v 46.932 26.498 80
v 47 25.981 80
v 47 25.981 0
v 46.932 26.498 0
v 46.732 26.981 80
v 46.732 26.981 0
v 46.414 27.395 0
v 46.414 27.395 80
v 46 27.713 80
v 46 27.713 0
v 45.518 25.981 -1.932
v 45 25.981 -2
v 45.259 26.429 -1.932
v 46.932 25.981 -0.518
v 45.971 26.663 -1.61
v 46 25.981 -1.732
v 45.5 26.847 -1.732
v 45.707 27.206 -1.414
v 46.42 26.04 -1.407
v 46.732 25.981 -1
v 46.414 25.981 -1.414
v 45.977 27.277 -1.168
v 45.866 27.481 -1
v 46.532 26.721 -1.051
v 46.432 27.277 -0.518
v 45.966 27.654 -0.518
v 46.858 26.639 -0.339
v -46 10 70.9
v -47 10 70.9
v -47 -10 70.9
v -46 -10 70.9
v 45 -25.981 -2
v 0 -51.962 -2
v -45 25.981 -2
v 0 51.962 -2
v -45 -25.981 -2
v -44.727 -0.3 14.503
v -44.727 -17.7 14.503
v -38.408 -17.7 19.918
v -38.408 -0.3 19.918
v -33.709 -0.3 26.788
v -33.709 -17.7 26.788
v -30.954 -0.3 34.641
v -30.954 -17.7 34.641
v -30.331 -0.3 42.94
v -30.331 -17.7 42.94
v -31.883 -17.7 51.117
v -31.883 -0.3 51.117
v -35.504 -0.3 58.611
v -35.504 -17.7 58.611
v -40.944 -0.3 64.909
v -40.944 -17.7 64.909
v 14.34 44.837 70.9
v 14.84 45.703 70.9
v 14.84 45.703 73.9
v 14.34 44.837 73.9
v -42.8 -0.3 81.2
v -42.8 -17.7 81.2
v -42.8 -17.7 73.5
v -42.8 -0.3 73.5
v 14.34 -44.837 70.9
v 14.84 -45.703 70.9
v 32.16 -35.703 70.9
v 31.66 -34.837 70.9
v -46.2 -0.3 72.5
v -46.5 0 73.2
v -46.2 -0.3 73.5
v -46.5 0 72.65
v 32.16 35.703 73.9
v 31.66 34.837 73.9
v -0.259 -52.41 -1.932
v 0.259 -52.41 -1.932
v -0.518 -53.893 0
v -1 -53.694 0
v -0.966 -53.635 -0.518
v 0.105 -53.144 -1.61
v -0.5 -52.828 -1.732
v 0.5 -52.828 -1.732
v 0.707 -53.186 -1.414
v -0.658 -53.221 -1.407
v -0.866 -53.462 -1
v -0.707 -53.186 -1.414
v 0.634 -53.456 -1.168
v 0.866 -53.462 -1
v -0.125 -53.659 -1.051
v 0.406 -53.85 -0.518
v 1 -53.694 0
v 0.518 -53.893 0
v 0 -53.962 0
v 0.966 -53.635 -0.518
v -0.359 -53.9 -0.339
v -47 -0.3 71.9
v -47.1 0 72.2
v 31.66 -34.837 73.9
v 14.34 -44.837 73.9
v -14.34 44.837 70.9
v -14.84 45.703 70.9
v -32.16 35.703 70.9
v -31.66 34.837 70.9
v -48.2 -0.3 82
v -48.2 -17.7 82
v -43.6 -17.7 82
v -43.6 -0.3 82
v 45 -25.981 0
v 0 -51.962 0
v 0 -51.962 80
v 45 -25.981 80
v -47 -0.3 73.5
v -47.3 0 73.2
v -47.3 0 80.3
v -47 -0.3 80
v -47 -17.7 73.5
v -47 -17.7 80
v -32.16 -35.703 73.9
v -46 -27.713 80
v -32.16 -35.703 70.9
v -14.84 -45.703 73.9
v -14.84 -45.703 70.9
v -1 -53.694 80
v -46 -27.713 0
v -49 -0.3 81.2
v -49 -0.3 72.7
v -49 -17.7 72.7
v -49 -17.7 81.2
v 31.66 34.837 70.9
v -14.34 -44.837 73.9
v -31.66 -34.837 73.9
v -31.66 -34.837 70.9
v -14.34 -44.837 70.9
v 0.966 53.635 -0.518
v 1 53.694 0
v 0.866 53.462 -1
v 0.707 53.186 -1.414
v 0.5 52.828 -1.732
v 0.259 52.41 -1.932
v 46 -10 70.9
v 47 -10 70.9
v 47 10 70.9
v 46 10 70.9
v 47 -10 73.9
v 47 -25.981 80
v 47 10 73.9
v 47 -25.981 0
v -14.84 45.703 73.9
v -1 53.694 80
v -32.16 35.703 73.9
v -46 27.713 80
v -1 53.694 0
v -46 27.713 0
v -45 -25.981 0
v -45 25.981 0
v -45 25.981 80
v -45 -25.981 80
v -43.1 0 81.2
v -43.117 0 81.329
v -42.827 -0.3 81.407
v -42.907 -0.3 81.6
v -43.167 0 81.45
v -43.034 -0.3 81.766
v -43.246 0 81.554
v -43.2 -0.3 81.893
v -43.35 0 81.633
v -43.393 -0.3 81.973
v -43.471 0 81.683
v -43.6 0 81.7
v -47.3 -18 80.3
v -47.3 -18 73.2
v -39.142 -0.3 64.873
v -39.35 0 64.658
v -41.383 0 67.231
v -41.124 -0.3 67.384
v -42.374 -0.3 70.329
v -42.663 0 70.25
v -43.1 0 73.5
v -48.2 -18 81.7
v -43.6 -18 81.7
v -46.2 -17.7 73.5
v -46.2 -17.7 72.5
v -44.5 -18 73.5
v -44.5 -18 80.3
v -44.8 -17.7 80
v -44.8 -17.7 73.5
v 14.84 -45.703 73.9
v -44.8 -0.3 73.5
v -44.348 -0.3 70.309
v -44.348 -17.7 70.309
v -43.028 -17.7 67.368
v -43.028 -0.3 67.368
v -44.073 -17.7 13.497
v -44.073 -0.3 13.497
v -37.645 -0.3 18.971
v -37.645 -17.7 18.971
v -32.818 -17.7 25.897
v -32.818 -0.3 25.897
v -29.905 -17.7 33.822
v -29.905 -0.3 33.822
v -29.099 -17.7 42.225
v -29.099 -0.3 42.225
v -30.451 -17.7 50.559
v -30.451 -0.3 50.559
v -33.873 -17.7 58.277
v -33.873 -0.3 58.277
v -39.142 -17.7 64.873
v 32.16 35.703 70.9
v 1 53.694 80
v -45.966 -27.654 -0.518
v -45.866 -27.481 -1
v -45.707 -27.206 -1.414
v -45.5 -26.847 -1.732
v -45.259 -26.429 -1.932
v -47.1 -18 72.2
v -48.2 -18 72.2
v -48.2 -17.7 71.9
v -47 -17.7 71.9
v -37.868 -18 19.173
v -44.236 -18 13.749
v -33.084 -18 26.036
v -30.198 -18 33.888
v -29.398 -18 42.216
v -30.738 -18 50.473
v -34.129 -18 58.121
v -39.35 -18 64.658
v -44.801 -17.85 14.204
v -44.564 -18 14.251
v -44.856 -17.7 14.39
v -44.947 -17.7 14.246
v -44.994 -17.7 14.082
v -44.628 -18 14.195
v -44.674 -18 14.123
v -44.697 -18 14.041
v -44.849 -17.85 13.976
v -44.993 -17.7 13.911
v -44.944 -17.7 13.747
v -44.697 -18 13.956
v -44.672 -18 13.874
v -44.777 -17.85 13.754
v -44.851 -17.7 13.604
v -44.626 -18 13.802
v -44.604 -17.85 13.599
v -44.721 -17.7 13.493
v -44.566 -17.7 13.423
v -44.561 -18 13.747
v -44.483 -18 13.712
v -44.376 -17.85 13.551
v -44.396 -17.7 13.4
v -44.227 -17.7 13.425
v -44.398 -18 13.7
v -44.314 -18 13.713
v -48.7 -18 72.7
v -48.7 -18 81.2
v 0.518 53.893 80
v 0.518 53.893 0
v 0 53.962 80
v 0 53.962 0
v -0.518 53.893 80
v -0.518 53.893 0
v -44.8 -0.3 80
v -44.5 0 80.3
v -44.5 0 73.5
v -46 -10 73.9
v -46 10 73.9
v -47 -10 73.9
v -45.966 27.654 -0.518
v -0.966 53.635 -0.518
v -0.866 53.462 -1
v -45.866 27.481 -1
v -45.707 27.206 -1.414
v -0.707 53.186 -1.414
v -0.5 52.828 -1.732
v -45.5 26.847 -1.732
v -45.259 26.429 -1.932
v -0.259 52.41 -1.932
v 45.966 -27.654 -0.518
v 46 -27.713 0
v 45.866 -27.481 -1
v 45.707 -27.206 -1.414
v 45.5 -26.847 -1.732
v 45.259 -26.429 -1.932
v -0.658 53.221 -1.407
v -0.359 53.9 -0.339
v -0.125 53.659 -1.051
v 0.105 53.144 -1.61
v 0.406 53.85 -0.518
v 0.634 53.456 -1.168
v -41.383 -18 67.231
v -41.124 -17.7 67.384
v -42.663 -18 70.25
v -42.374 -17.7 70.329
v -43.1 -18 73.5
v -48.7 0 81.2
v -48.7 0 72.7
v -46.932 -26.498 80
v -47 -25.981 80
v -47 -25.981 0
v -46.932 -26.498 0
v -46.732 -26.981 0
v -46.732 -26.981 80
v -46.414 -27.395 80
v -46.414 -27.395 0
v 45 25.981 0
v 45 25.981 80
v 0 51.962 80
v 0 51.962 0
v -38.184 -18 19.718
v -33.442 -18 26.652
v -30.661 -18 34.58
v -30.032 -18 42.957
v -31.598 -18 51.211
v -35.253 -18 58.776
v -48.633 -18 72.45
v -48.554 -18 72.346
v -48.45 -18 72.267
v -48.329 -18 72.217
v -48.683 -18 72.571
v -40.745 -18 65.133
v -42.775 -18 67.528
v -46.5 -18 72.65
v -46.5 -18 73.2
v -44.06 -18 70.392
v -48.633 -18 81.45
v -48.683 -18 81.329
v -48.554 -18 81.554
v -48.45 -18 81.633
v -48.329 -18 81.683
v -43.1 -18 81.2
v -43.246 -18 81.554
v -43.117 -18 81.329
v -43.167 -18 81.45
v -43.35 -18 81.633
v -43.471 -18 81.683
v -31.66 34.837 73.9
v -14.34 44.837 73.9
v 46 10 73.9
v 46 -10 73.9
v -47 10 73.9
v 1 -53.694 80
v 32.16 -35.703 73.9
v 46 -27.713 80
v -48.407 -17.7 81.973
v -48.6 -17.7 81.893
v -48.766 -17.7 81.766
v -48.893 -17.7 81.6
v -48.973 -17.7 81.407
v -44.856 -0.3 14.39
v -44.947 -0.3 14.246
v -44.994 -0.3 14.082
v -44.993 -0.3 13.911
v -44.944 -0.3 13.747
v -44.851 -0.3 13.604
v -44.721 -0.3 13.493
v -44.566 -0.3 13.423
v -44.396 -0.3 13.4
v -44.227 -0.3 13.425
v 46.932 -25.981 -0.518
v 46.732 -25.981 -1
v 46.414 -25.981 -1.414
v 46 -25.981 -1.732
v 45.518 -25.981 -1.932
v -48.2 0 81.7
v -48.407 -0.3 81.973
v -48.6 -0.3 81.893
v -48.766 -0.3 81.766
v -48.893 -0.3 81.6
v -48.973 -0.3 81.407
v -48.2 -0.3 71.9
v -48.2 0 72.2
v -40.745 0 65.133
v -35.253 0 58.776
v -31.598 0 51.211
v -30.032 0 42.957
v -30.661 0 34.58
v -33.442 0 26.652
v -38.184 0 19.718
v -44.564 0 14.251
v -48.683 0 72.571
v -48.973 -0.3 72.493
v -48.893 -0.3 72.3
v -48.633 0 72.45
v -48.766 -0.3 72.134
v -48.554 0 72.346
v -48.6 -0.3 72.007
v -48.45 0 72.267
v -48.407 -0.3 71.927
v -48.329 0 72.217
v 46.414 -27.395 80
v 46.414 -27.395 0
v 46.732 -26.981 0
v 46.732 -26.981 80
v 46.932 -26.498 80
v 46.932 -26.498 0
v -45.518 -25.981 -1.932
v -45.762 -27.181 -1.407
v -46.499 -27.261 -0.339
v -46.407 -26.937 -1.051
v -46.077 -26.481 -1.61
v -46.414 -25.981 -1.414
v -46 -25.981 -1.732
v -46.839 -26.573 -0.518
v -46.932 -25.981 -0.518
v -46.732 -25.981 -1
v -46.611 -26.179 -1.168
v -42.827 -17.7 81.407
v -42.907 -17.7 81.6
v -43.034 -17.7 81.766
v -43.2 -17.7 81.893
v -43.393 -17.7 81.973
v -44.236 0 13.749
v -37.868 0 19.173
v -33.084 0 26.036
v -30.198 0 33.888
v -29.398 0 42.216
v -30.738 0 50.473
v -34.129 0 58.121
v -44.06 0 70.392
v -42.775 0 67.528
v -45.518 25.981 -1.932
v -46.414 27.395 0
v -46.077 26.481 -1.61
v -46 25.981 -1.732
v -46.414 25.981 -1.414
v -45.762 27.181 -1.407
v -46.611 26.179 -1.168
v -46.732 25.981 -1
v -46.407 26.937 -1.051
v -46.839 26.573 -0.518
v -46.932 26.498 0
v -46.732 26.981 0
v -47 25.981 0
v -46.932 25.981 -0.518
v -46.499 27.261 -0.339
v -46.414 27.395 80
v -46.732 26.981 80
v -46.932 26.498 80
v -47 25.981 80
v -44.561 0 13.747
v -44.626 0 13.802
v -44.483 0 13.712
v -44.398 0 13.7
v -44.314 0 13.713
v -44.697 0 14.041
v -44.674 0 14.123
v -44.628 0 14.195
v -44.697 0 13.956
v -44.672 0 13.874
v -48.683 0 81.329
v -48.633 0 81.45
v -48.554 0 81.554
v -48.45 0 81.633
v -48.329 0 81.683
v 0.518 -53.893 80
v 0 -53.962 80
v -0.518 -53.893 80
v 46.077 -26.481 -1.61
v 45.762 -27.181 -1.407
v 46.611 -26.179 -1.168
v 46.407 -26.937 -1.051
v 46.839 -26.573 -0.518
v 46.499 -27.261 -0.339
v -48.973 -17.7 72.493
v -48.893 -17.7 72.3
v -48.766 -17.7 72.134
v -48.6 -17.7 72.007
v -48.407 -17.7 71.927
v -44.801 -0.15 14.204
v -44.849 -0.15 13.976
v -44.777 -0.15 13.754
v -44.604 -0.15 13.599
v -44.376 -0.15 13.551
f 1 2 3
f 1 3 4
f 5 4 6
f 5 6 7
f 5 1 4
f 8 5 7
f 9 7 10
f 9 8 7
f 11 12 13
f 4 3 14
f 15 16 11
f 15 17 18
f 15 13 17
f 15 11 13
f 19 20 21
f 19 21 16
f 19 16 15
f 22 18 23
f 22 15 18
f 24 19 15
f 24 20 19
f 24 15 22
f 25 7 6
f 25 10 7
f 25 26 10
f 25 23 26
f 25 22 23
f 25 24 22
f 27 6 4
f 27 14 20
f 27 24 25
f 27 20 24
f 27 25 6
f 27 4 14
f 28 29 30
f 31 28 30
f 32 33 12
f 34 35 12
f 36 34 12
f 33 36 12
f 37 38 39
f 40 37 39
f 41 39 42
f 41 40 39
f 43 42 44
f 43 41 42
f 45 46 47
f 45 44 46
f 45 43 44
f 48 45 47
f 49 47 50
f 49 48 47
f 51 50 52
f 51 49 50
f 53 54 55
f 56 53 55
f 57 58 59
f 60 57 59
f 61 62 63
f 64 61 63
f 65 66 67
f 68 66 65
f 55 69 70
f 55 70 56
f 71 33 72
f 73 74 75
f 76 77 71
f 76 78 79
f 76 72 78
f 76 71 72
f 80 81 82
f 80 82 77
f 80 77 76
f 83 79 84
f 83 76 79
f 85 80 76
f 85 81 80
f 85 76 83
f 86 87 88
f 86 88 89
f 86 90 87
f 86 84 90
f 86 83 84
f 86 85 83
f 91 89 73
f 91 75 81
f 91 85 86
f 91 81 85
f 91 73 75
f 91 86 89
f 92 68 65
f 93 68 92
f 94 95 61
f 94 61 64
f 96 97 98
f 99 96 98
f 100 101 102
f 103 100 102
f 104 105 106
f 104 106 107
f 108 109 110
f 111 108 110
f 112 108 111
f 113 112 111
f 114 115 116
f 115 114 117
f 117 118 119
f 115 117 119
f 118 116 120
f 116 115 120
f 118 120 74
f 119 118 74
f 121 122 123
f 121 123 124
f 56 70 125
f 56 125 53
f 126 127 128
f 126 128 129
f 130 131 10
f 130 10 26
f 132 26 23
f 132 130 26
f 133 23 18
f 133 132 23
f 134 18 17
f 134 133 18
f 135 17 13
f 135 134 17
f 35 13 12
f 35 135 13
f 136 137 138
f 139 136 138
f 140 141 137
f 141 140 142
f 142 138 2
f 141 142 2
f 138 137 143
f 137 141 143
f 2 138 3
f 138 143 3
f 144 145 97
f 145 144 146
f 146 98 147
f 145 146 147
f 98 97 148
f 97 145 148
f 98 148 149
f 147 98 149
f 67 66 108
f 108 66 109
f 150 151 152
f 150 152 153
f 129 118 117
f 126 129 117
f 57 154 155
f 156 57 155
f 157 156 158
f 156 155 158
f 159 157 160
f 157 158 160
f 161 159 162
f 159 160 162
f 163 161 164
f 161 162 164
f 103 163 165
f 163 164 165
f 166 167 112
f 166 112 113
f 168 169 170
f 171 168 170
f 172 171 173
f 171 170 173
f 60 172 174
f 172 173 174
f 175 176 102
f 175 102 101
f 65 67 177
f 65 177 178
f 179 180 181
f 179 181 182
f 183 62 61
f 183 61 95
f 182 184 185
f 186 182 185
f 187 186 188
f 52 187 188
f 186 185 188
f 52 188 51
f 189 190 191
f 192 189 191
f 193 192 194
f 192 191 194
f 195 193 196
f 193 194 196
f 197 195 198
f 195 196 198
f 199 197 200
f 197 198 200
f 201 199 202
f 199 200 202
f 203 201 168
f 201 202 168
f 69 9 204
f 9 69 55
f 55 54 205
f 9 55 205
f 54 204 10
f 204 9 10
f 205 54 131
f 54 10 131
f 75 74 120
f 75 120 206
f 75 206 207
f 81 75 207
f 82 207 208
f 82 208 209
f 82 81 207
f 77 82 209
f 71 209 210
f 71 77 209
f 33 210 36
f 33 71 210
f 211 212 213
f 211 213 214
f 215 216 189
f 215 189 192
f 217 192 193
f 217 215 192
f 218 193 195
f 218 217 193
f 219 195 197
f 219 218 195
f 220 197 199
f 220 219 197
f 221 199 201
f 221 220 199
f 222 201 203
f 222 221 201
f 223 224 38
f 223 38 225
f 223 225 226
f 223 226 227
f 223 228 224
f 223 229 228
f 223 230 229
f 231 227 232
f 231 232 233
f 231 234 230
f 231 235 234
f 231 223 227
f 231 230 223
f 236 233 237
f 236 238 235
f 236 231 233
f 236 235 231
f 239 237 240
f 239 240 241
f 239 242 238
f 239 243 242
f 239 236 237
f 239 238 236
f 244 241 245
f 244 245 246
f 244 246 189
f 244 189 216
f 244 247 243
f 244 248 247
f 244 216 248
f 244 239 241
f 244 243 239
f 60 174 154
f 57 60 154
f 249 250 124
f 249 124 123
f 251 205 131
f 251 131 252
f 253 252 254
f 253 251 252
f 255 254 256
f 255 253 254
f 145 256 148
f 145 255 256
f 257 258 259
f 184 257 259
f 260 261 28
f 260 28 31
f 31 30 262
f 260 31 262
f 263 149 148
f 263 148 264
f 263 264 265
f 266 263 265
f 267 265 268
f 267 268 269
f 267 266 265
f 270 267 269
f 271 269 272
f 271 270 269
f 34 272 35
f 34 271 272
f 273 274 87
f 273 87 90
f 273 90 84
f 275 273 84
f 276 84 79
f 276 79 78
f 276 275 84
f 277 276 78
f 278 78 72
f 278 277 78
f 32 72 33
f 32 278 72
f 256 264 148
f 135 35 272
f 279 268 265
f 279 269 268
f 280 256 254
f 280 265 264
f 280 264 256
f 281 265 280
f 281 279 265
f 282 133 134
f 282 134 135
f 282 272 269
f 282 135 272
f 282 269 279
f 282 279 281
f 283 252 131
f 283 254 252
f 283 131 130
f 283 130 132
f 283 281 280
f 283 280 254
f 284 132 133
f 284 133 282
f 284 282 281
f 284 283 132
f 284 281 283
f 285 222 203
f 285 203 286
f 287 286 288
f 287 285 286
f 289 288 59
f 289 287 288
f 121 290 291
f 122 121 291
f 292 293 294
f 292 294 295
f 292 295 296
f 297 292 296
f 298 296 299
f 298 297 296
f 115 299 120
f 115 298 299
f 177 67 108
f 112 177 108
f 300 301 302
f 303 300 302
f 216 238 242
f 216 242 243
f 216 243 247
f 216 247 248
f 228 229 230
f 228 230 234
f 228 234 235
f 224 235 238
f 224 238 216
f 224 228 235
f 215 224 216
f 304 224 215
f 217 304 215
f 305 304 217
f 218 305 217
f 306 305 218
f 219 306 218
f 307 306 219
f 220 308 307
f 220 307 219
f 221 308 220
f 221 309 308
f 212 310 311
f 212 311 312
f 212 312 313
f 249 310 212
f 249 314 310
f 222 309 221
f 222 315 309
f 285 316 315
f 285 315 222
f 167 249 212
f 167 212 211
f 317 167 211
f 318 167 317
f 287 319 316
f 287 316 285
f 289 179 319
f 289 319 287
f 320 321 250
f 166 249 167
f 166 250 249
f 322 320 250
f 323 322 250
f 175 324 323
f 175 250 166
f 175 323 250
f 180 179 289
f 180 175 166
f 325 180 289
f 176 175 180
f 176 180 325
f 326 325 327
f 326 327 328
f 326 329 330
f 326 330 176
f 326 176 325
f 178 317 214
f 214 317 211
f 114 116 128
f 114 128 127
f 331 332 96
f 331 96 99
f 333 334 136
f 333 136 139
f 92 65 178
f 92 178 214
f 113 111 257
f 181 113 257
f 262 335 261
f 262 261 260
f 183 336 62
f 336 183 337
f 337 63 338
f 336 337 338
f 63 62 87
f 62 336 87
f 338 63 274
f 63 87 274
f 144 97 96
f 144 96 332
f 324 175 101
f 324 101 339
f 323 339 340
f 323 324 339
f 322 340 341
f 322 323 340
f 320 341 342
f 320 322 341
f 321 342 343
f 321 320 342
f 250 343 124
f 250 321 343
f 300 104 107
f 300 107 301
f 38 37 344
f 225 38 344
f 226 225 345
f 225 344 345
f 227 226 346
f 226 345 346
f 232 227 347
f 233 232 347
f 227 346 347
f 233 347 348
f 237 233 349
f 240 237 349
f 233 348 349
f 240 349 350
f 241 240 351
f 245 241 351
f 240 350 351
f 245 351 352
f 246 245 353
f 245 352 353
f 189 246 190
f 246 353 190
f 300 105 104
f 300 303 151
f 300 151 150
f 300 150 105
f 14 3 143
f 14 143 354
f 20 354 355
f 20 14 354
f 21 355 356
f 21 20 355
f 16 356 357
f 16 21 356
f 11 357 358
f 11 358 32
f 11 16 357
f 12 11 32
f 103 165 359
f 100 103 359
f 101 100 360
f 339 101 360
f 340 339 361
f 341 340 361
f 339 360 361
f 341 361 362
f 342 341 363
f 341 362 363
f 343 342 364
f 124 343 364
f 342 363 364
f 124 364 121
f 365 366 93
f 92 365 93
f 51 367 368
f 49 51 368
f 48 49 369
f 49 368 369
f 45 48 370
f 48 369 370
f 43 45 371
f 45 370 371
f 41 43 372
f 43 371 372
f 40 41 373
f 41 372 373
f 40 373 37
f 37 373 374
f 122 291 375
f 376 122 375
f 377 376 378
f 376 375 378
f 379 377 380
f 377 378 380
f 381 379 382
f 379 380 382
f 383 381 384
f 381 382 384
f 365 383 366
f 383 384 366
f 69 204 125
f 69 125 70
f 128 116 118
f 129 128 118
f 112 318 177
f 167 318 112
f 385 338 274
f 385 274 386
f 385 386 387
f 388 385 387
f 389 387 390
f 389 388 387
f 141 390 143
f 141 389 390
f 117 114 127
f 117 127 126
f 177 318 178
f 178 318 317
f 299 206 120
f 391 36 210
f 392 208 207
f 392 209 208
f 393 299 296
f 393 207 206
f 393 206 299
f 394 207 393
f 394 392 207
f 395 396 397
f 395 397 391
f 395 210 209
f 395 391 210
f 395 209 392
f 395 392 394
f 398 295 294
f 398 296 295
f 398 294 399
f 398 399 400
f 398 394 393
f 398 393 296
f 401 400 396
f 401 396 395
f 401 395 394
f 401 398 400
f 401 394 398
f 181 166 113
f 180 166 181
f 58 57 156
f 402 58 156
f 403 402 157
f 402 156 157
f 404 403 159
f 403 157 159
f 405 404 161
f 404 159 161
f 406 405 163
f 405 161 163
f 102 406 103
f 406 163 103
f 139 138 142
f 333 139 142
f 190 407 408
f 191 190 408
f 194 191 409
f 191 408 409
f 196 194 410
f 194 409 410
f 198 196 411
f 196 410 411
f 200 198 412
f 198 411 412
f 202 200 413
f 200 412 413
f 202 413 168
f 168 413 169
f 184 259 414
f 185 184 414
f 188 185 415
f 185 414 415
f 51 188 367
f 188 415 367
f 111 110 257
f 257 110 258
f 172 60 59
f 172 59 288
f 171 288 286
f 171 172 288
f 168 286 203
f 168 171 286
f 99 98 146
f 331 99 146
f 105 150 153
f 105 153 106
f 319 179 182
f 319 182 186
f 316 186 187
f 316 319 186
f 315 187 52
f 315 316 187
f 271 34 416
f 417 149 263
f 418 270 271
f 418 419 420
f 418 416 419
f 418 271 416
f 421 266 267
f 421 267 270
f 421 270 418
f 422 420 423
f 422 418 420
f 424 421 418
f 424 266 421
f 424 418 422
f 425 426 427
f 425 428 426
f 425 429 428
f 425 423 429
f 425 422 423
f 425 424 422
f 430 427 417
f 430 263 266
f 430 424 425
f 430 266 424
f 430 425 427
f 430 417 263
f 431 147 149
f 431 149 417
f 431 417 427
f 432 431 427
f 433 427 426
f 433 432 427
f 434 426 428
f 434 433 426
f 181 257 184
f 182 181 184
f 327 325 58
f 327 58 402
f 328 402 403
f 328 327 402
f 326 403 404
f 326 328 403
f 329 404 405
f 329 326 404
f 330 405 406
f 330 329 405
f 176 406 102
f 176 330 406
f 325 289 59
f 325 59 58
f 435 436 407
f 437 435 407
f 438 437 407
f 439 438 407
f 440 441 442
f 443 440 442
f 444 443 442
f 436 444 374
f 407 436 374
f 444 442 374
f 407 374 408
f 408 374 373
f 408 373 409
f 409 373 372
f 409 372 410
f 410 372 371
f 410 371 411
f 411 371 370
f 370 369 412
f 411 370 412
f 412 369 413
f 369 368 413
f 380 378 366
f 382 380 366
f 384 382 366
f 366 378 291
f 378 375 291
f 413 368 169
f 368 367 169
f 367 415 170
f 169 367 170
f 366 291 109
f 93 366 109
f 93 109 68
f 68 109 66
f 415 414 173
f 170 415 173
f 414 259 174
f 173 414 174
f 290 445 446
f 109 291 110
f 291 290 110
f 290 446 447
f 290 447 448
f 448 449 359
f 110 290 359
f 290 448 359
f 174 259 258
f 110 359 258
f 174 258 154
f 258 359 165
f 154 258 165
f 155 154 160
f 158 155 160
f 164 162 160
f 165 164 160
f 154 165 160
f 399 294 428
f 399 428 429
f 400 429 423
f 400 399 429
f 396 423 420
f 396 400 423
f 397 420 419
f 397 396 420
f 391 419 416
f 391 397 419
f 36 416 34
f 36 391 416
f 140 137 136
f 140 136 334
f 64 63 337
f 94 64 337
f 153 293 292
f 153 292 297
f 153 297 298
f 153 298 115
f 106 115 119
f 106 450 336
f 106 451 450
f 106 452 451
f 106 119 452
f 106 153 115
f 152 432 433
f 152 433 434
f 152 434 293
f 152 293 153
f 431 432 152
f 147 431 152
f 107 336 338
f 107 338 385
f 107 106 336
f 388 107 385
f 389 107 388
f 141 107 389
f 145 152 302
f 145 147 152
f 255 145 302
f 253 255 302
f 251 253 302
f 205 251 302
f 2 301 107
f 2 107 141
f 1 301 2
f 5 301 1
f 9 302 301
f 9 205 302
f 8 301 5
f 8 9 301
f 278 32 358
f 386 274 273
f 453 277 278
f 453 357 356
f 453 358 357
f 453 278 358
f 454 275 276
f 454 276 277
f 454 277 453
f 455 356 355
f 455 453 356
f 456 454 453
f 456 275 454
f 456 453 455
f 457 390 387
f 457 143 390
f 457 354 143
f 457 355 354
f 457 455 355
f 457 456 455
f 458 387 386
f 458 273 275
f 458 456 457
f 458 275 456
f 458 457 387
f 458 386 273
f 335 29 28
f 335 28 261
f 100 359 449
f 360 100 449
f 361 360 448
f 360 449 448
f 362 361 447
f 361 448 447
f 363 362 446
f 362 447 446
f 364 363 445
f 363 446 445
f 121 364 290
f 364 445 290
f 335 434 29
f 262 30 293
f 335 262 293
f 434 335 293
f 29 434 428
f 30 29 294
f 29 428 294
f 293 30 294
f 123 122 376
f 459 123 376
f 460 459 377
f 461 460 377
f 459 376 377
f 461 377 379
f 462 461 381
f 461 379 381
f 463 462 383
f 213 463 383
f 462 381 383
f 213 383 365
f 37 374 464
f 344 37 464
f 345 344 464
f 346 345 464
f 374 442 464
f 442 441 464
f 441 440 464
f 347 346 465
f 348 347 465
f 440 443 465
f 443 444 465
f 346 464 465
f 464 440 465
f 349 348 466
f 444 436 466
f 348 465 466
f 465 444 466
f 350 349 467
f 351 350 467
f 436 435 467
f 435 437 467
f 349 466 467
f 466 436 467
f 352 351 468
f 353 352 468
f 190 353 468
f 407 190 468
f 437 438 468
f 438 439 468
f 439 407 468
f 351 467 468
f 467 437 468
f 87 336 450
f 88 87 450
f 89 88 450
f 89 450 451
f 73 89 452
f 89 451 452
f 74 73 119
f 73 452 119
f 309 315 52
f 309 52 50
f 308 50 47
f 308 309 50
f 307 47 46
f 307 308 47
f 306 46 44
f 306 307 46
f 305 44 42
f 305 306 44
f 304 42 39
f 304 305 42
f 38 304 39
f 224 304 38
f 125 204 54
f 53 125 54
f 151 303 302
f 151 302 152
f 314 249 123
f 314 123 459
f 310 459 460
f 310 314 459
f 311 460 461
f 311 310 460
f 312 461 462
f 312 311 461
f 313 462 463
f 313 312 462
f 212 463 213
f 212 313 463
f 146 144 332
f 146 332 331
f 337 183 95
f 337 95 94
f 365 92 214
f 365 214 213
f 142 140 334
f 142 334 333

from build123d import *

# Parameters (mm, degrees)
PAD001_DEPTH       = 18
CHAMFER_SIZE       = 0.3
PAD_DEPTH          = 80
THICKNESS_T        = 2
SKETCH002_W        = 20
SKETCH002_H        = 3
POCKET_DEPTH       = 1
POLARPATTERN_COUNT = 6


with BuildPart() as wings:
    # Sketch001 → Pad001 (new body)
    with BuildSketch(Plane.XZ):
        with BuildLine():
            Line((-47, 73.5), (-47, 80))
            Line((-47, 80), (-44.8, 80))
            Line((-44.8, 80), (-44.8, 73.5))
            ThreePointArc((-44.8, 73.5), (-43.7918810074, 68.7917829084), (-40.9442963572, 64.9091454356))
            ThreePointArc((-44.7274259362, 14.5027845028), (-30.3701869984, 38.7703834331), (-40.9442963572, 64.9091454356))
            ThreePointArc((-44.7274259362, 14.5027845028), (-44.9027845028, 13.6725740638), (-44.0725740638, 13.4972154972))
            ThreePointArc((-44.0725740638, 13.4972154972), (-29.2319520072, 37.99758511), (-39.1416001485, 64.873430174))
            ThreePointArc((-42.8, 73.5), (-41.8476061158, 68.8148746965), (-39.1416001485, 64.873430174))
            Line((-42.8, 81.2), (-42.8, 73.5))
            ThreePointArc((-42.8, 81.2), (-43.0343145751, 81.7656854249), (-43.6, 82))
            Line((-48.2, 82), (-43.6, 82))
            ThreePointArc((-48.2, 82), (-48.7656854249, 81.7656854249), (-49, 81.2))
            Line((-49, 72.7), (-49, 81.2))
            ThreePointArc((-49, 72.7), (-48.7656854249, 72.1343145751), (-48.2, 71.9))
            Line((-47, 71.9), (-48.2, 71.9))
            Line((-46.2, 72.5), (-47, 71.9))
            Line((-46.2, 73.5), (-46.2, 72.5))
            Line((-46.2, 73.5), (-47, 73.5))
        make_face()
    extrude(amount=PAD001_DEPTH)

    # Chamfer
    chamfer_edges = [wings.edges().sort_by_distance(p)[0] for p in [
        (-46.6, -18, 73.5),
        (-47, -18, 76.75),
        (-45.9, -18, 80),
        (-44.8, -18, 76.75),
        (-43.791881, -18, 68.791783),
        (-30.370187, -18, 38.770383),
        (-44.902785, -18, 13.672574),
        (-29.231952, -18, 37.997585),
        (-41.847606, -18, 68.814875),
        (-42.8, -18, 77.35),
        (-43.034315, -18, 81.765685),
        (-45.9, -18, 82),
        (-48.765685, -18, 81.765685),
        (-49, -18, 76.95),
        (-48.765685, -18, 72.134315),
        (-47.6, -18, 71.9),
        (-46.6, -18, 72.2),
        (-46.2, -18, 73),
        (-46.6, 0, 73.5),
        (-47, 0, 76.75),
        (-45.9, 0, 80),
        (-44.8, 0, 76.75),
        (-43.791881, 0, 68.791783),
        (-30.370187, 0, 38.770383),
        (-44.902785, 0, 13.672574),
        (-29.231952, 0, 37.997585),
        (-41.847606, 0, 68.814875),
        (-42.8, 0, 77.35),
        (-43.034315, 0, 81.765685),
        (-45.9, 0, 82),
        (-48.765685, 0, 81.765685),
        (-49, 0, 76.95),
        (-48.765685, 0, 72.134315),
        (-47.6, 0, 71.9),
        (-46.6, 0, 72.2),
        (-46.2, 0, 73),
    ]]
    chamfer(chamfer_edges, length=CHAMFER_SIZE)


with BuildPart() as body:
    # Sketch → Pad (new body)
    with BuildSketch(Plane.XY):
        Polygon((0, -51.961524227), (45, -25.9807621135), (45, 25.9807621135), (0, 51.9615242271), (-45, 25.9807621136), (-45, -25.9807621135), align=None)
    extrude(amount=PAD_DEPTH)

    # Thickness
    thickness_openings = [body.faces().sort_by_distance(p)[0] for p in [
        (0, 0, 80),
    ]]
    offset(amount=THICKNESS_T, openings=thickness_openings)

    # Sketch002 (on Face20 of Thickness) → Pocket (cut)
    with BuildSketch(Plane(origin=(-23.5, -40.7031939778, 0), x_dir=(0.8660254038, -0.5, 0), z_dir=(-0.5, -0.8660254038, 0))):
        with Locations((0, 72.4)):
            Rectangle(SKETCH002_W, SKETCH002_H)
    pocket = extrude(amount=-POCKET_DEPTH, mode=Mode.SUBTRACT)

    # PolarPattern: Pocket ×6 about axis
    polarpattern_axis = Axis((0, 0, 0), (0, 0, 1))
    for i in range(1, POLARPATTERN_COUNT):
        add(pocket.rotate(polarpattern_axis, i * 360 / POLARPATTERN_COUNT), mode=Mode.SUBTRACT)


solid = Compound([wings.part, body.part])
